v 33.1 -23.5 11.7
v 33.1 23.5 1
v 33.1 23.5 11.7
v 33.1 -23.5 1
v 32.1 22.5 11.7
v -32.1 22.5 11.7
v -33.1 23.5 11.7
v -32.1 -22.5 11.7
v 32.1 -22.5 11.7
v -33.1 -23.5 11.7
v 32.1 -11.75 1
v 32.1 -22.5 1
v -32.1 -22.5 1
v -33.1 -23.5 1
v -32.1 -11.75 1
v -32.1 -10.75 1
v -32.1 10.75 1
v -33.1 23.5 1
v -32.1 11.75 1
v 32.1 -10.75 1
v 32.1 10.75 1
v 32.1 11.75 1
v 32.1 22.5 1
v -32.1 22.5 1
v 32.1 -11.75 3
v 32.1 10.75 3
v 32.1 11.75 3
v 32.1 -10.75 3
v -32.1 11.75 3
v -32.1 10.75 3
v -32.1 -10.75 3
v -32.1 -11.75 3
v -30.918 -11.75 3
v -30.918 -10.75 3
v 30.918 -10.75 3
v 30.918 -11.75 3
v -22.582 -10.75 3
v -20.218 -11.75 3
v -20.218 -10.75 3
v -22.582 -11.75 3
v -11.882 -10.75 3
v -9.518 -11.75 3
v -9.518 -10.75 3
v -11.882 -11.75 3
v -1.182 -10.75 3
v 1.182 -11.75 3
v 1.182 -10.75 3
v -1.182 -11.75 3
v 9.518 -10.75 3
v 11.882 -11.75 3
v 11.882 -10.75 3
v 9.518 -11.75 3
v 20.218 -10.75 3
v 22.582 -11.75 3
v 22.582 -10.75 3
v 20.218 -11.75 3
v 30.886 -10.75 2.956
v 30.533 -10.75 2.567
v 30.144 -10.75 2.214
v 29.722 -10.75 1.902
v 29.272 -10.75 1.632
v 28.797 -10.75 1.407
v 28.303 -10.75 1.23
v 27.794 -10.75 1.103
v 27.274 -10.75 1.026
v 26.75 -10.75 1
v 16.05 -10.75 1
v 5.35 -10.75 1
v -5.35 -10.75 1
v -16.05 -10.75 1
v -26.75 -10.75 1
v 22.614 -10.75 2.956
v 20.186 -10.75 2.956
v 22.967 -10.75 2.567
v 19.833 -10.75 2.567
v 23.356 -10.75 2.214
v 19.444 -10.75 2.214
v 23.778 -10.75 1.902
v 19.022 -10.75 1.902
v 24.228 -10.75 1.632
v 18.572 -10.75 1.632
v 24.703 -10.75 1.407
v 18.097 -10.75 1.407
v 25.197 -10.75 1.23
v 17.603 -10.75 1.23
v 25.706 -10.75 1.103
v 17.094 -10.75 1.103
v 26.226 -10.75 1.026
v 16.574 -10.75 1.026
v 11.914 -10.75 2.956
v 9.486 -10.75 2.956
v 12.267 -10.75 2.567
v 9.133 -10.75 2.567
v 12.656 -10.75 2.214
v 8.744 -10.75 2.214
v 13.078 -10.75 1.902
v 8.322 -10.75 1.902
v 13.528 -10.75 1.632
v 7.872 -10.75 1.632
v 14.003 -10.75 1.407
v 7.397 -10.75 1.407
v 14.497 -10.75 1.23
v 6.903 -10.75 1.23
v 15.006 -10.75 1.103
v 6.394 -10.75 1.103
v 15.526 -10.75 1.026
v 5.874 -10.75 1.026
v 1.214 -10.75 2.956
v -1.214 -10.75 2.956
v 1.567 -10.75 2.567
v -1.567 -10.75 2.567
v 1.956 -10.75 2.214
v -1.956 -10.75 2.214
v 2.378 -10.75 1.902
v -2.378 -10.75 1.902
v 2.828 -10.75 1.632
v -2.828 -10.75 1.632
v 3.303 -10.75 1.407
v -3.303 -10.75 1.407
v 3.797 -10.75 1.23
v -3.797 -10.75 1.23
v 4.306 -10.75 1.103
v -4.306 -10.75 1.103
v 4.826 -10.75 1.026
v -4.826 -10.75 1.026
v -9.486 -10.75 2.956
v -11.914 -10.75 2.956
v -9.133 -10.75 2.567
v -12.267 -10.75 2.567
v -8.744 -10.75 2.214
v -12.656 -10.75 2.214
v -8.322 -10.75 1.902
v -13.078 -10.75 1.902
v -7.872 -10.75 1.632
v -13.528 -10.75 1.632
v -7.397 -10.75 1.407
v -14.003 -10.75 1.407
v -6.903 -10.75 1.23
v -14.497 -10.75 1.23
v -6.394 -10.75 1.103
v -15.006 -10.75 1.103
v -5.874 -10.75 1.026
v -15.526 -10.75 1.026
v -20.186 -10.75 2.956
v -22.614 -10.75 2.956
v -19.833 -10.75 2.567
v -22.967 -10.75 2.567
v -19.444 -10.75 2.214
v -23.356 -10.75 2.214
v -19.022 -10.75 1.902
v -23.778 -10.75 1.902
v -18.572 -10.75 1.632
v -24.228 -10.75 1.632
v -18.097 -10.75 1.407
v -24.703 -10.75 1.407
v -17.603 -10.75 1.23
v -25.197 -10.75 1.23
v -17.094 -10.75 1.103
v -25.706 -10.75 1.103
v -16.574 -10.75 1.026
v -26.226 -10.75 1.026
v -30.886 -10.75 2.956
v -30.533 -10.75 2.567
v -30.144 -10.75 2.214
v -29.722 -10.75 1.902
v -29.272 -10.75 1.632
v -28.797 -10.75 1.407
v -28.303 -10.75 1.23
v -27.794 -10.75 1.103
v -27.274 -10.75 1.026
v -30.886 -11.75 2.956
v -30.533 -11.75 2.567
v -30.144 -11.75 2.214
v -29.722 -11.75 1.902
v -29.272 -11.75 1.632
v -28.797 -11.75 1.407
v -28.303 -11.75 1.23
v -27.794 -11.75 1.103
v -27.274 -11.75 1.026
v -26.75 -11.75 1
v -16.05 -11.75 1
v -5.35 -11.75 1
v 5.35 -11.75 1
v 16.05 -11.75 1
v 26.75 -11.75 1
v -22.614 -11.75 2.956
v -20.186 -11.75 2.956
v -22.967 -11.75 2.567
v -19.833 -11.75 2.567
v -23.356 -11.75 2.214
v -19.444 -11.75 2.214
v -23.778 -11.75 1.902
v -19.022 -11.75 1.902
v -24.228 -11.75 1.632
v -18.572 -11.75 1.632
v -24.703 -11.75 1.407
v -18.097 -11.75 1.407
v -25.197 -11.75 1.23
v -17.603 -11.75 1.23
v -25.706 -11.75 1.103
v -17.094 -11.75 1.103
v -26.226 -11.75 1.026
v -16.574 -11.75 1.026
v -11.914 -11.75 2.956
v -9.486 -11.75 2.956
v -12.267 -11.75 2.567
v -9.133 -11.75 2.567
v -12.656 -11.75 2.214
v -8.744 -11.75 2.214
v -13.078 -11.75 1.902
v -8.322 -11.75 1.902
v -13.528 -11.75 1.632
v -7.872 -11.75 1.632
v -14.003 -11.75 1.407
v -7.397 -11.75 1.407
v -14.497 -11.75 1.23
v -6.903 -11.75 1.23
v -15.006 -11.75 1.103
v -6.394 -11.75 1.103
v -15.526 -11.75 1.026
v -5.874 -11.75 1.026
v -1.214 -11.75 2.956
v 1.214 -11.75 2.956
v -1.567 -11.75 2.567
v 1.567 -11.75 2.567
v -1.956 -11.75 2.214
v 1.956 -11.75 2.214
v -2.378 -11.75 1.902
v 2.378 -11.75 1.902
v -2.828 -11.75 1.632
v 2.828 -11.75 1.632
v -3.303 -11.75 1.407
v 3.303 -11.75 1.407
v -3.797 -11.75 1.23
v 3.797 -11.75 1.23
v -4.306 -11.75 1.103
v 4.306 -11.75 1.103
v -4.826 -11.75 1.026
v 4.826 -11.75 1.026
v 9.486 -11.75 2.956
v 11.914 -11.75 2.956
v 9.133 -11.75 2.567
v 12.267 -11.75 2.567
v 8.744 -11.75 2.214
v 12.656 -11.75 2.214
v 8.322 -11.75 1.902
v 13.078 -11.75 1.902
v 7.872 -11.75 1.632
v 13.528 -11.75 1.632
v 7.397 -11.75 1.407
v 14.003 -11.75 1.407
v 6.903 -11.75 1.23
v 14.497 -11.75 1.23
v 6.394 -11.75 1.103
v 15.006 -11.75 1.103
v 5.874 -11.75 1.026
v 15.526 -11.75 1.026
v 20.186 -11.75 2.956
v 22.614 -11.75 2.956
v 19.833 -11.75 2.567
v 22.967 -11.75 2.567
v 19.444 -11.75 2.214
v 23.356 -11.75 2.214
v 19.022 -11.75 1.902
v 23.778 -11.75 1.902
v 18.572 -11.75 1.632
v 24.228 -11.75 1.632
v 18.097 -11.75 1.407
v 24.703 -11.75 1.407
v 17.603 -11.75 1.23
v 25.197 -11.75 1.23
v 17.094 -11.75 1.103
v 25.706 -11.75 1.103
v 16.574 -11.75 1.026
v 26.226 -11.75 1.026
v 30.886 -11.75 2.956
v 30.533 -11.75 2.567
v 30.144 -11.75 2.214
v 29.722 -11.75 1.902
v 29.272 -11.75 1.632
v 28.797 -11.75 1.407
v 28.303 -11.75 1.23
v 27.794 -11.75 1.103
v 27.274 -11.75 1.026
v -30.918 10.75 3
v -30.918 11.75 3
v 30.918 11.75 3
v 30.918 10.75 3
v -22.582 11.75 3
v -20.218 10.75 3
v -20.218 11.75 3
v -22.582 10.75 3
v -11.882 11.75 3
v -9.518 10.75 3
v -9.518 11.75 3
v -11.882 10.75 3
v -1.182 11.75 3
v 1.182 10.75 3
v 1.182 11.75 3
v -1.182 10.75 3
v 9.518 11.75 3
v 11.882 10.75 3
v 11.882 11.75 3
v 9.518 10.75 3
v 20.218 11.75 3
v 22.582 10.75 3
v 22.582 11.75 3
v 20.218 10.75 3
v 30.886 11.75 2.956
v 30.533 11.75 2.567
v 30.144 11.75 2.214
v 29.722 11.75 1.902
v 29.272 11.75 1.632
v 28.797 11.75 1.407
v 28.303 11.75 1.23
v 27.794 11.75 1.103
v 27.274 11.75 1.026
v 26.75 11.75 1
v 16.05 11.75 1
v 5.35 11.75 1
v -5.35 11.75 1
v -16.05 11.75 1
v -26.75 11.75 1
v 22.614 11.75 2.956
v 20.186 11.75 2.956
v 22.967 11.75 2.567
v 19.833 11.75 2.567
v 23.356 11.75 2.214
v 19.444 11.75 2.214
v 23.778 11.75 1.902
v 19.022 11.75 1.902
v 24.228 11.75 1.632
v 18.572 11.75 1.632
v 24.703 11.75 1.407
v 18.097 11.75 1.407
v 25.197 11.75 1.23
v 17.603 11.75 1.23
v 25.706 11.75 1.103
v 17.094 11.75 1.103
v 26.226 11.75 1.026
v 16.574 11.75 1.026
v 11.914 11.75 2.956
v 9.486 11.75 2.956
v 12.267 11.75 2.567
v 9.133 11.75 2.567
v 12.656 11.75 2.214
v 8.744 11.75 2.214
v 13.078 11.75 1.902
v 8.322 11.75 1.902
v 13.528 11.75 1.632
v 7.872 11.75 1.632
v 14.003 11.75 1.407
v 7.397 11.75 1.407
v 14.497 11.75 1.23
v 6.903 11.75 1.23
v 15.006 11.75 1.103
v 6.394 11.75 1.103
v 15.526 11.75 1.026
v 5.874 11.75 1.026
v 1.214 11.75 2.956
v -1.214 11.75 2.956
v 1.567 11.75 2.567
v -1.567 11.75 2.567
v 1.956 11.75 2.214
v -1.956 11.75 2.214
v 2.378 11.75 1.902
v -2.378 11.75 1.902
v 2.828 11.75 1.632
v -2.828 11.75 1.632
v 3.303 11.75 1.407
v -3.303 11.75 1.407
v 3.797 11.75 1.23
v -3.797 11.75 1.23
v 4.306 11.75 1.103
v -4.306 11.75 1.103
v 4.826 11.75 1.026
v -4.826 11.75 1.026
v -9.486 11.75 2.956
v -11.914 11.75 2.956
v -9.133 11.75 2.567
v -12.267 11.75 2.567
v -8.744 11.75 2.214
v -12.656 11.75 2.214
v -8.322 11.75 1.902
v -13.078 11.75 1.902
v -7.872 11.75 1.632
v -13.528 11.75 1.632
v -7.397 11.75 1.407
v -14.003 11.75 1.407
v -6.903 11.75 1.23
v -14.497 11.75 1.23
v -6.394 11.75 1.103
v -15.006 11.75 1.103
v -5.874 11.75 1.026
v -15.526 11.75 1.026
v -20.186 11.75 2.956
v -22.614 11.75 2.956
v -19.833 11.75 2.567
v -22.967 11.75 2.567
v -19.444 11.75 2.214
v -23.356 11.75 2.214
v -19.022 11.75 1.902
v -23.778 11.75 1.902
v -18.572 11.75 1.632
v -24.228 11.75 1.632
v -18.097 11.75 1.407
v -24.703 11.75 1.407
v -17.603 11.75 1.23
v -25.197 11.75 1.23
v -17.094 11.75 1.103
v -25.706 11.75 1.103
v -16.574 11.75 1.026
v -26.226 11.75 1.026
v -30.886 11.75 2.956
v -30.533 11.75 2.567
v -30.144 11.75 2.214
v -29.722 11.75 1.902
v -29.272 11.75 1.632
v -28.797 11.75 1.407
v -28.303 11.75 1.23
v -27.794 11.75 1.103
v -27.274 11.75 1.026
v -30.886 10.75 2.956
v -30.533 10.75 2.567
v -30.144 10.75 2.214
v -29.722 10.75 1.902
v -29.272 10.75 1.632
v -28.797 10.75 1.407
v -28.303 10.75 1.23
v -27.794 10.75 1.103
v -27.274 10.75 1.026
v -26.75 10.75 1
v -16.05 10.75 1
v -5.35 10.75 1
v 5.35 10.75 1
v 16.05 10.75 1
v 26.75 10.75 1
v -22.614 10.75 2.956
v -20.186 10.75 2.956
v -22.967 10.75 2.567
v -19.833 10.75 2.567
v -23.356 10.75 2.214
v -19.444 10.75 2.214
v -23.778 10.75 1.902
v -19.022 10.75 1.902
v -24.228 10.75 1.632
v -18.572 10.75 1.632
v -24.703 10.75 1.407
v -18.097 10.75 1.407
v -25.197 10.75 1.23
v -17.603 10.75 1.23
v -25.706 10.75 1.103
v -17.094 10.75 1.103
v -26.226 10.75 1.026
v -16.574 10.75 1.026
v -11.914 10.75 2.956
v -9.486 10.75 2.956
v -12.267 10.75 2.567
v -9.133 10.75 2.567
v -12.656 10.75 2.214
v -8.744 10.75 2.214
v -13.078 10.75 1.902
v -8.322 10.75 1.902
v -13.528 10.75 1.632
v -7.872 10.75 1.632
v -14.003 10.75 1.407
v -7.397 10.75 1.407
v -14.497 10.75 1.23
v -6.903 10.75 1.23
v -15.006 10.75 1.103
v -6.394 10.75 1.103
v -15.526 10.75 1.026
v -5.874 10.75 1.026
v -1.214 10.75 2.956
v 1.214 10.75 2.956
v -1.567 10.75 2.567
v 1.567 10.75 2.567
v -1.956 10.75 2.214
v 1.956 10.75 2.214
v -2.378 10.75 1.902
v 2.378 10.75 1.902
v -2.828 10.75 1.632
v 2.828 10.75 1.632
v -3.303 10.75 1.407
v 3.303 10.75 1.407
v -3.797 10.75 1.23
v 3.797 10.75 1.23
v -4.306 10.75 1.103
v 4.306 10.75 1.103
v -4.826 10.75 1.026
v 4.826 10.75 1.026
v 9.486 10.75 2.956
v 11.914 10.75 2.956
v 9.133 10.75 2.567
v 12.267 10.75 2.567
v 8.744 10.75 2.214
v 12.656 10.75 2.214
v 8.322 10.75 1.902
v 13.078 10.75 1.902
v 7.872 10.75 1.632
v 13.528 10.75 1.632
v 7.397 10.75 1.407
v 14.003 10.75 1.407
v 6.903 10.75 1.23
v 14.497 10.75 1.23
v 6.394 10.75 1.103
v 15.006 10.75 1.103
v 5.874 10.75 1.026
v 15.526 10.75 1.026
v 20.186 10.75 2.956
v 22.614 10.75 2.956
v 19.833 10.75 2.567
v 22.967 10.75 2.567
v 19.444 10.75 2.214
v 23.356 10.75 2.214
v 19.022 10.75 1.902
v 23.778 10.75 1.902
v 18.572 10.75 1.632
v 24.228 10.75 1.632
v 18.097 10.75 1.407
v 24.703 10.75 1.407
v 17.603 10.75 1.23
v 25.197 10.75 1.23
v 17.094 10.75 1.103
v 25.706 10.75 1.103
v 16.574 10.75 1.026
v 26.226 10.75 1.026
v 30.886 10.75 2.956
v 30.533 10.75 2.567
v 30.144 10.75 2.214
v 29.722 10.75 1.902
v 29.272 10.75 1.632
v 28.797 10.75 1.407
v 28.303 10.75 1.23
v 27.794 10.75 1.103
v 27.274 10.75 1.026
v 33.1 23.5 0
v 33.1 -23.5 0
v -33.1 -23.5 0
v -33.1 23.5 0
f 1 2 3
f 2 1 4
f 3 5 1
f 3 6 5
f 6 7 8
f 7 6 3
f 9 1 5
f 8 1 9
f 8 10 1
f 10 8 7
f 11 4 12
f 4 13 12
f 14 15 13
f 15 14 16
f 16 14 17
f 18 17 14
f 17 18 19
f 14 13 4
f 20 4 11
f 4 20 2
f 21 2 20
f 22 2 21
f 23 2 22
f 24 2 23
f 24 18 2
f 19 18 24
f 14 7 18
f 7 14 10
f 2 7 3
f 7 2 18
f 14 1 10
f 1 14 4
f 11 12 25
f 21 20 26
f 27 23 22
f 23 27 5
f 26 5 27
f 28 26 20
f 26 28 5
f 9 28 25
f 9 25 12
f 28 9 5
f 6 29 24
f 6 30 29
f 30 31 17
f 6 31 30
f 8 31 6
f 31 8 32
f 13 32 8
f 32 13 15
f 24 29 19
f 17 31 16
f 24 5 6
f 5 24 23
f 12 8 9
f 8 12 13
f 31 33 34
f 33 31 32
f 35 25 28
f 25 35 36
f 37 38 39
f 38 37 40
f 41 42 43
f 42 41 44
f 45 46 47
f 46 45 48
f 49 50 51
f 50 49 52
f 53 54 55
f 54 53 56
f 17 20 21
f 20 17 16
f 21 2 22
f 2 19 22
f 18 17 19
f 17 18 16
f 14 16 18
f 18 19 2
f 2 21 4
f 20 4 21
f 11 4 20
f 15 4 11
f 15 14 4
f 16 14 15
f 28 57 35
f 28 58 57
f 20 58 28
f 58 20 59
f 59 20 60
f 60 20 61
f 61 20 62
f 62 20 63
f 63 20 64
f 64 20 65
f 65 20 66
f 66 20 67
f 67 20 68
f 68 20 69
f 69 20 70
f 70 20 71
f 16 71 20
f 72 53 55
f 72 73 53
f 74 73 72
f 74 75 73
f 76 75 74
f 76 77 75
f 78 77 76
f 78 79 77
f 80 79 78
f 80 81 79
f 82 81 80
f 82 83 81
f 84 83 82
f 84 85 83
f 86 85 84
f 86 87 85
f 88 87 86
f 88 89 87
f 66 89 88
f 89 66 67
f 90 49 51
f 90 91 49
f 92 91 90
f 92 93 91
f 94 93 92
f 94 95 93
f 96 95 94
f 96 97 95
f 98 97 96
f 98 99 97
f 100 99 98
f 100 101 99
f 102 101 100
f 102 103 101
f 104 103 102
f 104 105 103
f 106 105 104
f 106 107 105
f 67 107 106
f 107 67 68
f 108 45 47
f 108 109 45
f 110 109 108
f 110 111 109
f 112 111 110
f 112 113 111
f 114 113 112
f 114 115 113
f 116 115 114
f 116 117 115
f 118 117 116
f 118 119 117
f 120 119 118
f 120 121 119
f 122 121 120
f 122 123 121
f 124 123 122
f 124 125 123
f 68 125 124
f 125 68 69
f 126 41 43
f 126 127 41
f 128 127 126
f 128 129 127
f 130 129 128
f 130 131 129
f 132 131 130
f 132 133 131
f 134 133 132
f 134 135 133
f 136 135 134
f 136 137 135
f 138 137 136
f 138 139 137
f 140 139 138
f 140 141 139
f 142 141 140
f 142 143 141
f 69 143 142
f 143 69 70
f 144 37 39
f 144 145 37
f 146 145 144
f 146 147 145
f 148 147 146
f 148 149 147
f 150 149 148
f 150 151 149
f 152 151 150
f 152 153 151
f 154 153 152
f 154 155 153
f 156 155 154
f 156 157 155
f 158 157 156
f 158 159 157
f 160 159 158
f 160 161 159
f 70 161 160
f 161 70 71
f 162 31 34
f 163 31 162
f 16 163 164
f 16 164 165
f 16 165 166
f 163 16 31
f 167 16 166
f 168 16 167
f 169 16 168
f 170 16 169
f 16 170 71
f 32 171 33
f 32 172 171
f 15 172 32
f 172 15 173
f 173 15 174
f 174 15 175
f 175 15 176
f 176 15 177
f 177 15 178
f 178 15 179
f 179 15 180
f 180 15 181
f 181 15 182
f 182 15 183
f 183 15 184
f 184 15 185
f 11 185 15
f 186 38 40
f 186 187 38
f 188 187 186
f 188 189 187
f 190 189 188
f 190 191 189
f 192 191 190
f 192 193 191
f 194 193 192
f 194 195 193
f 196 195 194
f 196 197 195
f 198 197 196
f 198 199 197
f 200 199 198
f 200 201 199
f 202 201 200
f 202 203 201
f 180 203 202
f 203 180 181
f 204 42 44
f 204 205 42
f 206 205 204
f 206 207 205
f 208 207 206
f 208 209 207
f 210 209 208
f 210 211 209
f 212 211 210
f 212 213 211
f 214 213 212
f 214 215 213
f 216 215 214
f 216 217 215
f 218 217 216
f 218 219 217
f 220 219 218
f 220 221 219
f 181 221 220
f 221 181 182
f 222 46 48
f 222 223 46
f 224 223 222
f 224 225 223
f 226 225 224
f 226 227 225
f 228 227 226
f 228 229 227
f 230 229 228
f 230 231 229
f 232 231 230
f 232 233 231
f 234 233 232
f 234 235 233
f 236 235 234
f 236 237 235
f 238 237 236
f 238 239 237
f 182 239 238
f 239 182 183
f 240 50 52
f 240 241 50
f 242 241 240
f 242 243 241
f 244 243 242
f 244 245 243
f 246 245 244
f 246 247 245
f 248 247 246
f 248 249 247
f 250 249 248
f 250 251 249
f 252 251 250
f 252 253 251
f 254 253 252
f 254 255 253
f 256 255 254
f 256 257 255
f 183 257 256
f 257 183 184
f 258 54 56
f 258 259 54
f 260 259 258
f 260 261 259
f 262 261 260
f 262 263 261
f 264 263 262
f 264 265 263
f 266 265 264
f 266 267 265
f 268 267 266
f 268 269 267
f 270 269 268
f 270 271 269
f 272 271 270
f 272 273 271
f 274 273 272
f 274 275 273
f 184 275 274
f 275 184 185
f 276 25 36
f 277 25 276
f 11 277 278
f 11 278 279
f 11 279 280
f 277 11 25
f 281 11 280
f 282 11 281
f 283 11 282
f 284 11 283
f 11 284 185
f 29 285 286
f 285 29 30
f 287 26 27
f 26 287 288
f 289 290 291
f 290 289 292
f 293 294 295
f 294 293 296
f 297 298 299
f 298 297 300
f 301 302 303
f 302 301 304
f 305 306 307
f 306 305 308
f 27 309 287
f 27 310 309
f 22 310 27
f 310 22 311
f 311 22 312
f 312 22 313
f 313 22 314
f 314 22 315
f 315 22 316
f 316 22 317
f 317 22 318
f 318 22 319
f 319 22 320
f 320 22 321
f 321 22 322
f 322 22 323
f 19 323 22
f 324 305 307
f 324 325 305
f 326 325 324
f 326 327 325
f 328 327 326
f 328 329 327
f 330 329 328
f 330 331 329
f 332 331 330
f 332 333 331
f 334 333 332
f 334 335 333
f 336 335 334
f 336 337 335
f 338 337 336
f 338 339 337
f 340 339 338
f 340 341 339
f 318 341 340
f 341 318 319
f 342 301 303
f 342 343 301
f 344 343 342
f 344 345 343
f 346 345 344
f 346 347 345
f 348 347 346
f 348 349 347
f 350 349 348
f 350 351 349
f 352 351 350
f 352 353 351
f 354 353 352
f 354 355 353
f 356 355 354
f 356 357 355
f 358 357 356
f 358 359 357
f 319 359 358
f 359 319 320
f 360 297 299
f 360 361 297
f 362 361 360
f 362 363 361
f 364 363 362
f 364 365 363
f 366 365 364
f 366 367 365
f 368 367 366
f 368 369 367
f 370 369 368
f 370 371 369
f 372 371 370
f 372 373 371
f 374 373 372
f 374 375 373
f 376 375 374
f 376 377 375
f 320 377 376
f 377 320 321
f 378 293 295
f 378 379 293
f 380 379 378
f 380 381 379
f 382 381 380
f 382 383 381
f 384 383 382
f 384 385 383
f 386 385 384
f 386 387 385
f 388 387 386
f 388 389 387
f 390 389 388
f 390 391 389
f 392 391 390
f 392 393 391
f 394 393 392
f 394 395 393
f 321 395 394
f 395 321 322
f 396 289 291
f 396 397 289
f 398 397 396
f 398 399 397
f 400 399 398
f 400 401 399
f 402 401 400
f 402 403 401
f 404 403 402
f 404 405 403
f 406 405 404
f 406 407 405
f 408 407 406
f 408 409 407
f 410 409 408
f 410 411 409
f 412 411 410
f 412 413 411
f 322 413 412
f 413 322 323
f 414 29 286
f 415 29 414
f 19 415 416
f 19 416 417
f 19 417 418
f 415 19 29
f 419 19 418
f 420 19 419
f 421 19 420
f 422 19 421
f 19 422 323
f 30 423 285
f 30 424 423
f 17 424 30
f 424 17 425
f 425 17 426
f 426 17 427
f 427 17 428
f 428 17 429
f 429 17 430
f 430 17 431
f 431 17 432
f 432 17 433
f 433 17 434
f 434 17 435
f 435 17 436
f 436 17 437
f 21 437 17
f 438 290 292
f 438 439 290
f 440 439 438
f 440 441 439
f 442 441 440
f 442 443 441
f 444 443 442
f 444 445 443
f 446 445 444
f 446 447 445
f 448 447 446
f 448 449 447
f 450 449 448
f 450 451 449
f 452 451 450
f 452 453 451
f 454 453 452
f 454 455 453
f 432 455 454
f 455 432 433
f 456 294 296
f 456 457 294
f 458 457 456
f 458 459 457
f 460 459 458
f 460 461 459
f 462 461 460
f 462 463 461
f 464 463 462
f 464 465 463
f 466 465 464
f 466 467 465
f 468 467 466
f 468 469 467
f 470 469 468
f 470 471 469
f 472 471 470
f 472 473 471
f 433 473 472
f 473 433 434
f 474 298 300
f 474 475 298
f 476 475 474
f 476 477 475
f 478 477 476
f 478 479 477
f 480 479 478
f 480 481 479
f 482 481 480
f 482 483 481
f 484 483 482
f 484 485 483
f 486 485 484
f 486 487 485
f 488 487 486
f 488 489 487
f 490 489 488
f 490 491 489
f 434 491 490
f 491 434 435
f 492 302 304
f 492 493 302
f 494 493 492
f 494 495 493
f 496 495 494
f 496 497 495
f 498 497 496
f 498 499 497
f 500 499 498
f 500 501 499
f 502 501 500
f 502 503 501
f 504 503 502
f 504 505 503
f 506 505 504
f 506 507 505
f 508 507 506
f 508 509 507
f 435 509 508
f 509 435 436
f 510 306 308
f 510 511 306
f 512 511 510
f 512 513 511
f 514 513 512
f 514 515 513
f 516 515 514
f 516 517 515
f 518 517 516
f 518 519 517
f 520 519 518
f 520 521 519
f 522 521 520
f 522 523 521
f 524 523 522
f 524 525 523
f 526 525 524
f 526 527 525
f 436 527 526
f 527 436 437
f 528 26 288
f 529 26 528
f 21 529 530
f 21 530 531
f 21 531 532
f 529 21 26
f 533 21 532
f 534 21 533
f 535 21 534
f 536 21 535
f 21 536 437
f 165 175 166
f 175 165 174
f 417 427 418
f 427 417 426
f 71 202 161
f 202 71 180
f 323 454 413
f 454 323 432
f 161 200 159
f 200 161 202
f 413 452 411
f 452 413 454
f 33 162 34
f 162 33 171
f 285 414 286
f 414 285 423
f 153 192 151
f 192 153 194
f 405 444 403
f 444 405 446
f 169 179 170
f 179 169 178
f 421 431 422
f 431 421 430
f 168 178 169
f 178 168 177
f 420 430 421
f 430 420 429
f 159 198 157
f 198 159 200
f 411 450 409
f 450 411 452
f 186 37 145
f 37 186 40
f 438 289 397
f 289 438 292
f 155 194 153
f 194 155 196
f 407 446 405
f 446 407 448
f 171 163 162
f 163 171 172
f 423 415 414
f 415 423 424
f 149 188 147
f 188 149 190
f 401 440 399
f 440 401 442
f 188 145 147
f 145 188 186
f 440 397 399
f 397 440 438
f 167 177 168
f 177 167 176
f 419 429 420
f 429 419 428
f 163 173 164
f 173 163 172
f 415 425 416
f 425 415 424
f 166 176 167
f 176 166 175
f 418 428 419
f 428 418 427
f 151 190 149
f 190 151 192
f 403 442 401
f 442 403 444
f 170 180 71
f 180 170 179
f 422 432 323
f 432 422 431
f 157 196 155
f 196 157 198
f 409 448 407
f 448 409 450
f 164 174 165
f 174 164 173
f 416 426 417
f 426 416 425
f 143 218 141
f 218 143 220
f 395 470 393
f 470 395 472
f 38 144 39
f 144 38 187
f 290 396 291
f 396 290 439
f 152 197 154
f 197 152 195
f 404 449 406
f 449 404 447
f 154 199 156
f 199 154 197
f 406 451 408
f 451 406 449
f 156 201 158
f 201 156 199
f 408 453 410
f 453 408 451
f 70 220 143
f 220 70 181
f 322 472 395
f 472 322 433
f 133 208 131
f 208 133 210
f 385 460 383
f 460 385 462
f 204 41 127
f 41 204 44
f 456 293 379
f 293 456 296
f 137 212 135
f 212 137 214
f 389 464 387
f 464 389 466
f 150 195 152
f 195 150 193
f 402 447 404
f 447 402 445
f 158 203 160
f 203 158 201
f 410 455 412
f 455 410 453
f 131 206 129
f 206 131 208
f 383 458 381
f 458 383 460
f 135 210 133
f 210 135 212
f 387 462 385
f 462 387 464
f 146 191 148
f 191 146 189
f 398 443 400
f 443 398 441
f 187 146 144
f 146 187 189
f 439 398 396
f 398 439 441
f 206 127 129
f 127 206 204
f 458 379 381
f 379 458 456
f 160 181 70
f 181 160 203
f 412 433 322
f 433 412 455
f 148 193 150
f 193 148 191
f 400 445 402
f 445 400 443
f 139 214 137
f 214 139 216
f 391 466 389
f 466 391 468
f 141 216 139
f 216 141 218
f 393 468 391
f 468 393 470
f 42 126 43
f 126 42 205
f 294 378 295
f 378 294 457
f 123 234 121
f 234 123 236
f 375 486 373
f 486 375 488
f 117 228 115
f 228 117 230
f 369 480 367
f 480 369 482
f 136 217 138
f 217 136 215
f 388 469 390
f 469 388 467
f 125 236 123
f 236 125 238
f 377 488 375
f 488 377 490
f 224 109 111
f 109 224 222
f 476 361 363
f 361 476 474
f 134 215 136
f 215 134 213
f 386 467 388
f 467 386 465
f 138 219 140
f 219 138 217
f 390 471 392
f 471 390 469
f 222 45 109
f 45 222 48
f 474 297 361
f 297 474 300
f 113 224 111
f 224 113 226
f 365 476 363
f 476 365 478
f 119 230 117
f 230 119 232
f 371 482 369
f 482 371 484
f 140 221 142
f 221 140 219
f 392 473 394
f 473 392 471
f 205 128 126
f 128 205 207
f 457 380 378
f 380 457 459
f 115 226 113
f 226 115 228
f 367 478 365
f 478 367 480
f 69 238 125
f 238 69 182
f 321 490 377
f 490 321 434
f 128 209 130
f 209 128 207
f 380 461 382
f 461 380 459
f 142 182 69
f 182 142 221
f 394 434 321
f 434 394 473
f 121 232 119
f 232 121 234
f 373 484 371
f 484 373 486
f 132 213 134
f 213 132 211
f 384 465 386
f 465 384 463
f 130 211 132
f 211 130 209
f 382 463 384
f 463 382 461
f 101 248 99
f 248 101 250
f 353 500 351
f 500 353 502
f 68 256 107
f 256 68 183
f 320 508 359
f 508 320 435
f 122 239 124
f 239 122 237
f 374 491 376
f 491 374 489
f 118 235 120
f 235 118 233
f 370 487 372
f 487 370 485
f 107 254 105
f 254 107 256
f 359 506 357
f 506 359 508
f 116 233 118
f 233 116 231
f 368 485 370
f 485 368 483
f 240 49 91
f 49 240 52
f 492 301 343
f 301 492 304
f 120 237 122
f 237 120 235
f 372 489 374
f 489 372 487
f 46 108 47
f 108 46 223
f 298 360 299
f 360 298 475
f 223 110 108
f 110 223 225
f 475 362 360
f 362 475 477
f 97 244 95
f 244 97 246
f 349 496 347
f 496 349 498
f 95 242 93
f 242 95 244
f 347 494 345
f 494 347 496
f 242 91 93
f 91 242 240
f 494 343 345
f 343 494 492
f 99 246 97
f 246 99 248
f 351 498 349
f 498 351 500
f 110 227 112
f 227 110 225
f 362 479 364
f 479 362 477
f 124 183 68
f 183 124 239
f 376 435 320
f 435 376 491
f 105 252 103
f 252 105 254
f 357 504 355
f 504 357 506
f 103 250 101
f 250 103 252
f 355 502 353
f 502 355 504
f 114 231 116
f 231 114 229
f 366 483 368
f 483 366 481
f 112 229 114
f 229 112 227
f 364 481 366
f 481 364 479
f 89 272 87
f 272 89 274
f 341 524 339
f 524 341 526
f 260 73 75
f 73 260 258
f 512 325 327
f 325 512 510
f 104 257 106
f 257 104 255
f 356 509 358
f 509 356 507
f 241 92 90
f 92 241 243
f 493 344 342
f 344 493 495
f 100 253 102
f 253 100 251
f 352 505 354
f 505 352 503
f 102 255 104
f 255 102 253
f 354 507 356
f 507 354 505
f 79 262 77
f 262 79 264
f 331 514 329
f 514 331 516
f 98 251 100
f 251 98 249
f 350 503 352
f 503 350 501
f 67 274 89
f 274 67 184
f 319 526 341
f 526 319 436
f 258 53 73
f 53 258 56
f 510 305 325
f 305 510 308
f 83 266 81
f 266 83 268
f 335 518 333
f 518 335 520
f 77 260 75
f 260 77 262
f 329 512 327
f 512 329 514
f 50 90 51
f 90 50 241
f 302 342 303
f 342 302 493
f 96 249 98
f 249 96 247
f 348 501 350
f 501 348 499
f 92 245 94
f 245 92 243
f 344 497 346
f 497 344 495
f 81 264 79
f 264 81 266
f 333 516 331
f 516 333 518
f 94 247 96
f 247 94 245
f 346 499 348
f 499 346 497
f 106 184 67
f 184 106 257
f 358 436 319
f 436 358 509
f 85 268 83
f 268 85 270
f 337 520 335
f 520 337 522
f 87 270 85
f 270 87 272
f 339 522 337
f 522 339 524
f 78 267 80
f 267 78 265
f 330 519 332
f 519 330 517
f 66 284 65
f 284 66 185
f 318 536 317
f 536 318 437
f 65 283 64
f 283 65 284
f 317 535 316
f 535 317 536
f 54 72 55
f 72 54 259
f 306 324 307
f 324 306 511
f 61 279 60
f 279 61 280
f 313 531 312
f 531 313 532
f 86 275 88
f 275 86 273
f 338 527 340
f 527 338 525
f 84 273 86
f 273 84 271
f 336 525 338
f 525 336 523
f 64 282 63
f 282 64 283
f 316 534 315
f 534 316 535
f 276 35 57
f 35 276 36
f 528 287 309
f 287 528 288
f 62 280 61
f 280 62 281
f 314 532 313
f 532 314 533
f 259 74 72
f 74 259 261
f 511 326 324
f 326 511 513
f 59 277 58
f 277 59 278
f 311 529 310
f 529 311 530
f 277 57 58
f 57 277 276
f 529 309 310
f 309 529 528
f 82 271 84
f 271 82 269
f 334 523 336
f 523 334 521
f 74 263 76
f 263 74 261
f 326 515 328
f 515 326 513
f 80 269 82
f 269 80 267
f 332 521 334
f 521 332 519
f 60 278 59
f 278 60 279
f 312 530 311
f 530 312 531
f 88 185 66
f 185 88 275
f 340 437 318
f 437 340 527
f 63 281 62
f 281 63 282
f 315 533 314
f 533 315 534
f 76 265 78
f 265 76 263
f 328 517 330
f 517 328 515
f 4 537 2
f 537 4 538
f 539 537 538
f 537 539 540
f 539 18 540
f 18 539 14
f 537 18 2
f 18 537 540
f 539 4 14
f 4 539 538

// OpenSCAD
shell_thickness = 1;

battery_height = 44.5 + 0.5;
battery_diameter = 10.5 + 0.2;


translate([0,0,shell_thickness/2]){
    cube([battery_diameter*6+2*shell_thickness,battery_height+2*shell_thickness,shell_thickness], center=true);
}

translate([0,0,battery_diameter/2+shell_thickness]){   
    difference() {
        cube([battery_diameter*6+2*shell_thickness,battery_height+2*shell_thickness,battery_diameter], center=true);
        cube([battery_diameter*6,battery_height,battery_diameter+0.01], center=true);
    }
}

difference() {
    translate([0,0,1+shell_thickness])
    {
        for (y = [-0.25*battery_height,0.25*battery_height]) {
            translate([0,y,0]){
                cube([battery_diameter*6,shell_thickness,2],center=true);
            }
        }
    }

    translate([0,0,battery_diameter/2+shell_thickness])
    {
        rotate([90,0,0])
        {
            for (x = [-2.5*battery_diameter,-1.5*battery_diameter,-0.5*battery_diameter,0.5*battery_diameter,1.5*battery_diameter,2.5*battery_diameter]) {
                translate([x,0,0]) {
                    cylinder(h=battery_height,d=battery_diameter, $fn=64, center=true);
                }
            }
        }
    }
}
